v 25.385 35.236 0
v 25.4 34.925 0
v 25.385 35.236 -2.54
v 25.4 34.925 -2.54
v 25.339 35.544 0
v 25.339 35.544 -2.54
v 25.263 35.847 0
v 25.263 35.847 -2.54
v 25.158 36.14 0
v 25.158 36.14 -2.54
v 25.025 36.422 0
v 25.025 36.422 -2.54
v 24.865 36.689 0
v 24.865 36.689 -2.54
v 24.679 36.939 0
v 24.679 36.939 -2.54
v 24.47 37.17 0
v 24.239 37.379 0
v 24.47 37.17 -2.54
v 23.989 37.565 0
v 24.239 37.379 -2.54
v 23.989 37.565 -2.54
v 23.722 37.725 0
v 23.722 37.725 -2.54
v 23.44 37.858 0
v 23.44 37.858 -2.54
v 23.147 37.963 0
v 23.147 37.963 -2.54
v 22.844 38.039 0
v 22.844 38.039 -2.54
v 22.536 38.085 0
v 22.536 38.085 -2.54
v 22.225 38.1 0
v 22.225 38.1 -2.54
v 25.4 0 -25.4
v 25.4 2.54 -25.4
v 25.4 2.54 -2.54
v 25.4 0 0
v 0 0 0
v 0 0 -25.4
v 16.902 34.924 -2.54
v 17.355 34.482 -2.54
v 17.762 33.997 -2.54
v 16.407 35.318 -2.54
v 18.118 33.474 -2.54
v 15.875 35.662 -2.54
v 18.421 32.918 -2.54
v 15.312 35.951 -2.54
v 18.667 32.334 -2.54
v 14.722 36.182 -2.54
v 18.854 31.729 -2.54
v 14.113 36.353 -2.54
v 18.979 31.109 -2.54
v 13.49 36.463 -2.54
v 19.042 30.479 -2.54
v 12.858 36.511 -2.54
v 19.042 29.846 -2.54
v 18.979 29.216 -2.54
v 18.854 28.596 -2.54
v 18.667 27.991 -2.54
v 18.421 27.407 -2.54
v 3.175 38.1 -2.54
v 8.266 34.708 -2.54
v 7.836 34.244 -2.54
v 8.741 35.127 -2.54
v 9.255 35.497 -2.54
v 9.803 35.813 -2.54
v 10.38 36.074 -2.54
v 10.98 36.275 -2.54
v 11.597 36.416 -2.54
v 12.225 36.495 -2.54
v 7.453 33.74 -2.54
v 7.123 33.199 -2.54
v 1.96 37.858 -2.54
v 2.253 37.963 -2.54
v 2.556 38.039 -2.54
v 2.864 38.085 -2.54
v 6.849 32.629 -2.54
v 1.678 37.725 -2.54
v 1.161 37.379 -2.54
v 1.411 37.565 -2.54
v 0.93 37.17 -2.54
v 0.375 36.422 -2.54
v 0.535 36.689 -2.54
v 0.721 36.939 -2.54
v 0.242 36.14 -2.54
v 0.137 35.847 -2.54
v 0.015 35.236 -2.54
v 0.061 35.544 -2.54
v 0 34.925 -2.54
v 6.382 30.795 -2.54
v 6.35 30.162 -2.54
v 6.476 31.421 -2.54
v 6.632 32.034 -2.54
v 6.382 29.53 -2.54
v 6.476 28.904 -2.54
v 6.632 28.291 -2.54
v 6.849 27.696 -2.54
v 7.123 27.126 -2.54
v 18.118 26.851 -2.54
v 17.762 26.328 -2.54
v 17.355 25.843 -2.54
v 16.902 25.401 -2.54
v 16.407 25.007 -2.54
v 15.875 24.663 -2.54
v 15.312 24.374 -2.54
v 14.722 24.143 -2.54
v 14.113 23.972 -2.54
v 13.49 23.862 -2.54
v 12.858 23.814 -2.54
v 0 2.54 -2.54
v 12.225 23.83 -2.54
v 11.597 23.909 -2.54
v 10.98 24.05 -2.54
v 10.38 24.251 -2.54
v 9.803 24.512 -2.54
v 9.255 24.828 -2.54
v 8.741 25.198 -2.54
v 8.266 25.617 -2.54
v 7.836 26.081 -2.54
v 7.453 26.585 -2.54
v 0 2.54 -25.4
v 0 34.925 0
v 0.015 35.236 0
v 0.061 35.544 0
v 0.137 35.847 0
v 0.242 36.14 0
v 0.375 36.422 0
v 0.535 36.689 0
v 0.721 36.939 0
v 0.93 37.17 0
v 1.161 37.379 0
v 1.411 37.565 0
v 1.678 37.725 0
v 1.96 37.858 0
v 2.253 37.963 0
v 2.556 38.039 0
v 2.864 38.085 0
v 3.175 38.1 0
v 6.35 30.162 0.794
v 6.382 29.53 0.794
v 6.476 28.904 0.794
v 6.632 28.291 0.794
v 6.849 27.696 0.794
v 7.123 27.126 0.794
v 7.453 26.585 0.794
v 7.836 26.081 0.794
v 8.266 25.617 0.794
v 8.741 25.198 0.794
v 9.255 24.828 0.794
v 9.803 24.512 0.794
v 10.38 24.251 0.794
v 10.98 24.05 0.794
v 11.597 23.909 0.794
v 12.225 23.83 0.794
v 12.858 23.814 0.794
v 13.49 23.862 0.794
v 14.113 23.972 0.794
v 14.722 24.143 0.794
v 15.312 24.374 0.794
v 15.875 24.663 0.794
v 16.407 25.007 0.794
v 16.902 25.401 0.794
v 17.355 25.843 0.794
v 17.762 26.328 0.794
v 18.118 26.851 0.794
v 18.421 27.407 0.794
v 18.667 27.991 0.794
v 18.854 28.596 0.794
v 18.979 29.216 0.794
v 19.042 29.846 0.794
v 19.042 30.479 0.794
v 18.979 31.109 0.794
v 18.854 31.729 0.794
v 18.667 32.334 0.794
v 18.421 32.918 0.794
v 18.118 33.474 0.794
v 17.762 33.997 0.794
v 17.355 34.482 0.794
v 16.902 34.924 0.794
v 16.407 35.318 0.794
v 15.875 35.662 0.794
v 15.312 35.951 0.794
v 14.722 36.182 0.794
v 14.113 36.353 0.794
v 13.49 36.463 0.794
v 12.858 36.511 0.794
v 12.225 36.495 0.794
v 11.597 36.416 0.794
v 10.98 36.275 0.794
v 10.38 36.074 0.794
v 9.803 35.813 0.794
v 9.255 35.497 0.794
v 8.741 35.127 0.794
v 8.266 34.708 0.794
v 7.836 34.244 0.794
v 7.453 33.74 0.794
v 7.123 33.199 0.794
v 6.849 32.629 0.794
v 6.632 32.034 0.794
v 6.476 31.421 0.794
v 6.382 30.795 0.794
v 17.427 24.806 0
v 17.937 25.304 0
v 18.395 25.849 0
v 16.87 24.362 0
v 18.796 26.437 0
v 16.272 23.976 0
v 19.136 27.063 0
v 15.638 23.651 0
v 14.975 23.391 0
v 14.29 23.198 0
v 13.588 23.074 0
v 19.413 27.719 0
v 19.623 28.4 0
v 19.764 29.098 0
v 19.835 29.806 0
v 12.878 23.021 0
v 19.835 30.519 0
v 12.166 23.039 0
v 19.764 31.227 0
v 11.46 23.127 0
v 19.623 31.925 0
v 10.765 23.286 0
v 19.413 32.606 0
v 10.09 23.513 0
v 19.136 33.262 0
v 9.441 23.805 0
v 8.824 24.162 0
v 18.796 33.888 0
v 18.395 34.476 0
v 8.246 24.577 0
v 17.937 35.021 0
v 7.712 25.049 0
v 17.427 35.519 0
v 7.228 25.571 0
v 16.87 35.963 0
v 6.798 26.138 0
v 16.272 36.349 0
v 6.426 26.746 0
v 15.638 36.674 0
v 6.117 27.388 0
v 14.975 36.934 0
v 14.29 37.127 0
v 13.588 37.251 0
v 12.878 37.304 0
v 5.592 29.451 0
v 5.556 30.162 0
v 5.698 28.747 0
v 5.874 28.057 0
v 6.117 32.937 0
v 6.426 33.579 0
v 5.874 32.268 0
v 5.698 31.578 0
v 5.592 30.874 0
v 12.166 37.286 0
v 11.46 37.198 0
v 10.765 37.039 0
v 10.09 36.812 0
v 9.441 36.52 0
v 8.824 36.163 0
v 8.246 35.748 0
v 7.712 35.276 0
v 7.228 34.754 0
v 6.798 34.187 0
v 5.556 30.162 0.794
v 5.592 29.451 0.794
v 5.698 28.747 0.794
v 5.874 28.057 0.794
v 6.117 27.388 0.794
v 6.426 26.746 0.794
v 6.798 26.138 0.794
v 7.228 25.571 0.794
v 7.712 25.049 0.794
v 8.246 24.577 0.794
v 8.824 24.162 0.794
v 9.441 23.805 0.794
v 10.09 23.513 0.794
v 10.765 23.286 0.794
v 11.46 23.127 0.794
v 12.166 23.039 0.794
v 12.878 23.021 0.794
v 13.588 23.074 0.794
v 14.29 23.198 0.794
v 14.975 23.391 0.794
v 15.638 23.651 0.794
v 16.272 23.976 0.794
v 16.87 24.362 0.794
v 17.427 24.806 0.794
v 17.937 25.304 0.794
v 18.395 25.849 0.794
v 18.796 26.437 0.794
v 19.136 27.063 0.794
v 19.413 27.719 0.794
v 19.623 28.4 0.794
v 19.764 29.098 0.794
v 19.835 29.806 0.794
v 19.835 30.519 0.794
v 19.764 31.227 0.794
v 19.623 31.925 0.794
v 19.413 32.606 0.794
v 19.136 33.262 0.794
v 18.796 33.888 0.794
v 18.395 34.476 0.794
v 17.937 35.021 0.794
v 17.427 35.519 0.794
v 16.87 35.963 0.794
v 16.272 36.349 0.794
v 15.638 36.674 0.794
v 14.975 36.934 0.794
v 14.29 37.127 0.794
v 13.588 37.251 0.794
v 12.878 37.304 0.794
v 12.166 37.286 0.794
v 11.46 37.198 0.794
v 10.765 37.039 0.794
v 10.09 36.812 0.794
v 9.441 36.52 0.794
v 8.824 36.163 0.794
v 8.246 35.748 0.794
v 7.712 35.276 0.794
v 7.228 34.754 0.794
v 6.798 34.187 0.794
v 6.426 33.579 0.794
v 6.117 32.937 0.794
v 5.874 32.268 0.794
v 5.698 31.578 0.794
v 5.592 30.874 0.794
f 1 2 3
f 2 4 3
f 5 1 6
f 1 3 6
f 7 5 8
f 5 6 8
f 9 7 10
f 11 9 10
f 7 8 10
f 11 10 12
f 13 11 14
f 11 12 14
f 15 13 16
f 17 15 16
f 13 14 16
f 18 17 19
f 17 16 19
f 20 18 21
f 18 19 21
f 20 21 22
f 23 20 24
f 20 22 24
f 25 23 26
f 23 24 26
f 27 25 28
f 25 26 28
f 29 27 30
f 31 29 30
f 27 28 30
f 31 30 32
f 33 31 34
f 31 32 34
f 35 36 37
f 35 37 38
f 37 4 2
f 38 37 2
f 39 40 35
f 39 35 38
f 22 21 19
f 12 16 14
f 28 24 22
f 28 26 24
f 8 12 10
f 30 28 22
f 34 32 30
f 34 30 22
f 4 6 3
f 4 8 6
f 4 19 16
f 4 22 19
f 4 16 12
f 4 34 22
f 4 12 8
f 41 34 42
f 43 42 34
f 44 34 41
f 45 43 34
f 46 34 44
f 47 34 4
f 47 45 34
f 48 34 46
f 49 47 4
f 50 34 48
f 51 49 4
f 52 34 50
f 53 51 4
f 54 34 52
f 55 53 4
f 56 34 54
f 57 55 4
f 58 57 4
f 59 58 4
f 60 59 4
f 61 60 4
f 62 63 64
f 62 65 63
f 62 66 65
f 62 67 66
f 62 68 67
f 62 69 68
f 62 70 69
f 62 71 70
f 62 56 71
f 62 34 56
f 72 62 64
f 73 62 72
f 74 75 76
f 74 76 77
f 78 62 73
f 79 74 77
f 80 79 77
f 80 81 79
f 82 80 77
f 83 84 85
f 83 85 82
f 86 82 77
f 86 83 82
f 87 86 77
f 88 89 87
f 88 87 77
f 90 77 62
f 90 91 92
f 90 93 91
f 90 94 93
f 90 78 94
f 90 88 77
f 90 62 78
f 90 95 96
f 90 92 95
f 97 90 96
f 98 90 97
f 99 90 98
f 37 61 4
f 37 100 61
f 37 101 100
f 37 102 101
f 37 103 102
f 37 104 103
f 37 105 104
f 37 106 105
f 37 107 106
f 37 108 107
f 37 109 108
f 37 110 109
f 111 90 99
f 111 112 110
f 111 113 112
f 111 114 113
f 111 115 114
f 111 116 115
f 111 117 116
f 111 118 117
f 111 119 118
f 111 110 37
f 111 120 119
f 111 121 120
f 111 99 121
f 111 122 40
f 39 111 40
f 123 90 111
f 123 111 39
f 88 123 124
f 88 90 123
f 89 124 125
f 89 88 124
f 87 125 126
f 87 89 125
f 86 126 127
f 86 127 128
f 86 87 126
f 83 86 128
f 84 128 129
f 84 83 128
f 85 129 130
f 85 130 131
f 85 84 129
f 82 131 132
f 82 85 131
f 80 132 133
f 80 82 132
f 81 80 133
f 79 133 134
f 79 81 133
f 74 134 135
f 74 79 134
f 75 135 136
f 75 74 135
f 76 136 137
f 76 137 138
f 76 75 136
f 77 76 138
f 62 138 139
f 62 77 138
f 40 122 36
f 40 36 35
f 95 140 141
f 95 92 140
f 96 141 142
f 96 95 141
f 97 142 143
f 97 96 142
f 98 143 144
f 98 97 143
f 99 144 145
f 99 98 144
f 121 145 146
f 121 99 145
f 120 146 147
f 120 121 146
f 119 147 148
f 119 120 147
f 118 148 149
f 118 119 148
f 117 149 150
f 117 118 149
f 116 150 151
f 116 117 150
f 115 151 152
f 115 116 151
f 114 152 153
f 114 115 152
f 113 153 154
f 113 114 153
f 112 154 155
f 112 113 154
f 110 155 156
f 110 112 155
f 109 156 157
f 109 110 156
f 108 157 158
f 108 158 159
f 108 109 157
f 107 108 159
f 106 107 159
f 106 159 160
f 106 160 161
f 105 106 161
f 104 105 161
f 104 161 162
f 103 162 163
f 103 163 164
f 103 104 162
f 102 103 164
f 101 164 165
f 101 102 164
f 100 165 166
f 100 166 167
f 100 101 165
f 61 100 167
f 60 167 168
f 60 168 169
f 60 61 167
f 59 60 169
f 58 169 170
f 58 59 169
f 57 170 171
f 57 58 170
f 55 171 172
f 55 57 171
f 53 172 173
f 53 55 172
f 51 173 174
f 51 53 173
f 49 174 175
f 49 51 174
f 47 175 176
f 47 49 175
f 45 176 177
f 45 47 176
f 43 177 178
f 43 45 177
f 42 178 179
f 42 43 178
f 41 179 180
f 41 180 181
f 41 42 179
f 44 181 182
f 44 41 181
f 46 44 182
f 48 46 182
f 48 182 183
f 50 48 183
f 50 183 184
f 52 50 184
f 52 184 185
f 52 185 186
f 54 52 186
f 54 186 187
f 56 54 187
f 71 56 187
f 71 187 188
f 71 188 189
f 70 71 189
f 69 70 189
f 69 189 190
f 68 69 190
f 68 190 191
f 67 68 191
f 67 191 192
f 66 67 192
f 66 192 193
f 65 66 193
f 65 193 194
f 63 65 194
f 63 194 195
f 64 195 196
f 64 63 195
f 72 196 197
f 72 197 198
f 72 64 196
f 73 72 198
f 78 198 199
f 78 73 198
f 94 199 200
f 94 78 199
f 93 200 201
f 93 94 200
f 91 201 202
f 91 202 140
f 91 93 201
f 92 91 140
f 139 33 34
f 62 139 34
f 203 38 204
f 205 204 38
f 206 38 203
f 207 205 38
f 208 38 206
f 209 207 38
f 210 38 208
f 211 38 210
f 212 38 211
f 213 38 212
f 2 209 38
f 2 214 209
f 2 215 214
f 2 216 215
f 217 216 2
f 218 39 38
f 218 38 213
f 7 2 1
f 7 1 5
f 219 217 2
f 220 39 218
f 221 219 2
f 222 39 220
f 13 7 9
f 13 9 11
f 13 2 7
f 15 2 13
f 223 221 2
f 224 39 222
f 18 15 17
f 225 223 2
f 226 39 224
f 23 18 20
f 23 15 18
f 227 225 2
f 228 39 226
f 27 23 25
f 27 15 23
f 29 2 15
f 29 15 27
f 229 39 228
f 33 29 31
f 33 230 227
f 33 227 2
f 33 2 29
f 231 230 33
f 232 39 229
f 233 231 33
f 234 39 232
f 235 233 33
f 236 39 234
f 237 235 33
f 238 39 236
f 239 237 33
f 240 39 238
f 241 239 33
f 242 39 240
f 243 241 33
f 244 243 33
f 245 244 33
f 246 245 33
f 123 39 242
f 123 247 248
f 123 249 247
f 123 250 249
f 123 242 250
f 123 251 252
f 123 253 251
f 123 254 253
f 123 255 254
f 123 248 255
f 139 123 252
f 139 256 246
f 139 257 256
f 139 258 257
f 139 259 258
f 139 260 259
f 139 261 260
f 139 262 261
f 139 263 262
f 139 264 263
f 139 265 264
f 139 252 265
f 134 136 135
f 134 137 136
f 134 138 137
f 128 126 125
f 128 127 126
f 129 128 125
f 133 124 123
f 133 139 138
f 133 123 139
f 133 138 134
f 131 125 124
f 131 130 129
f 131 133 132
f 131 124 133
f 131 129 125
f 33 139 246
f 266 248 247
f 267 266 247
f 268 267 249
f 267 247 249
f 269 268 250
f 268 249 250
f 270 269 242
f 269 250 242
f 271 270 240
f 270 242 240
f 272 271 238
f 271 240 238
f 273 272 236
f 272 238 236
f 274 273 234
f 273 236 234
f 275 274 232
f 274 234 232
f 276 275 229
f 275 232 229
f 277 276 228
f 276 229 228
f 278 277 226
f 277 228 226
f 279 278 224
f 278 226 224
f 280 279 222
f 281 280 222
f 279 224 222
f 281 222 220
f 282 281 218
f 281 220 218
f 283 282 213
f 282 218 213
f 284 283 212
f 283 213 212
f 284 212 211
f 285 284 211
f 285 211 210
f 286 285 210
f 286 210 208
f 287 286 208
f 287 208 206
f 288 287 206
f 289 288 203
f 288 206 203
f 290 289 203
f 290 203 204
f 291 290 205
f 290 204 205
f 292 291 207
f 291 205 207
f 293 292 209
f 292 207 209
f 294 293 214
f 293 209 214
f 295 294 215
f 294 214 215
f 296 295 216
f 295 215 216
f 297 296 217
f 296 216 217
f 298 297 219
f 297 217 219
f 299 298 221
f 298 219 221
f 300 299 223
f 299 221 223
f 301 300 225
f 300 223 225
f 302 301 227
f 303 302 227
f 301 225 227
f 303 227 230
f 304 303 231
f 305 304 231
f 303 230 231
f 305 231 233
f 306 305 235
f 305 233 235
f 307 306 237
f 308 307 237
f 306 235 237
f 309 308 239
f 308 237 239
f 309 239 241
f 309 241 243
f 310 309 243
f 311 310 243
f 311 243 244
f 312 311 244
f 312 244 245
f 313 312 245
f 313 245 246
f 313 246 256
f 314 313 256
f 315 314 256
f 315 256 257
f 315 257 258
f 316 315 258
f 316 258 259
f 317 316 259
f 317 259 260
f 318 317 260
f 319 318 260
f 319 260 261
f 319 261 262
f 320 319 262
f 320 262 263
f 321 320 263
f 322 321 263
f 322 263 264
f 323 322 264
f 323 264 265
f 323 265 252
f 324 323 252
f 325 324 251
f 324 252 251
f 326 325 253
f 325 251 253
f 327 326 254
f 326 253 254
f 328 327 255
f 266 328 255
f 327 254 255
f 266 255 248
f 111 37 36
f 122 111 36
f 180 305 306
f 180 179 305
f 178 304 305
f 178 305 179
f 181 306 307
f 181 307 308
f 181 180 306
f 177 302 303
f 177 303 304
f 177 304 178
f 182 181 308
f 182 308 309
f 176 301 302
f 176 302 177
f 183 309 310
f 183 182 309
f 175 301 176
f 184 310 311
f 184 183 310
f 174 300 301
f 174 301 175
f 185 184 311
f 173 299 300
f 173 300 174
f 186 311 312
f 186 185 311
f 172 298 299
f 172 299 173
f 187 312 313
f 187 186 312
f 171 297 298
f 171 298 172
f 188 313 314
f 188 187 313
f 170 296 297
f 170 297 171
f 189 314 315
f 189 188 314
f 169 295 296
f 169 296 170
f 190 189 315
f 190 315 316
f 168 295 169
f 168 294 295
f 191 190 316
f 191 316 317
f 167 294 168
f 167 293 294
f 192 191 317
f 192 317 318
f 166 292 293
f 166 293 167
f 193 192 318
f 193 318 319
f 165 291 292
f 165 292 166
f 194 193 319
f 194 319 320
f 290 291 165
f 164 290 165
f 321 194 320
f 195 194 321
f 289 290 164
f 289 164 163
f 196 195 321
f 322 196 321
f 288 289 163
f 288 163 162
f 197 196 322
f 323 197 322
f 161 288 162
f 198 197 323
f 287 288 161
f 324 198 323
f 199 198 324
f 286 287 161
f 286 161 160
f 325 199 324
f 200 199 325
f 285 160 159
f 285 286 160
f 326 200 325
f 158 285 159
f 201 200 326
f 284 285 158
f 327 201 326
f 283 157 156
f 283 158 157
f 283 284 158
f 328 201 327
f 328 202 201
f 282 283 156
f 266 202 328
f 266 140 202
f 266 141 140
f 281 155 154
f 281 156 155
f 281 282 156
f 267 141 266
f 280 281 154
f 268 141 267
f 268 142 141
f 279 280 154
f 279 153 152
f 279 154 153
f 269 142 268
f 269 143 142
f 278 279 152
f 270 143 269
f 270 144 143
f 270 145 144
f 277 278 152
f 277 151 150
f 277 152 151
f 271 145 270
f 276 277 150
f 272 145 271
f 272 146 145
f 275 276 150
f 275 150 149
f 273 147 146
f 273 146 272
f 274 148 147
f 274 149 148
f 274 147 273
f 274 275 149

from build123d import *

# Parameters (mm, degrees)
BOSS_EXTRUDE1_DEPTH = 25.4
CUT_EXTRUDE1_REACH  = 53.18
SKETCH2_R           = 6.35
FILLET1_R           = 3.175
SKETCH3_R           = 7.14375
SKETCH3_R_2         = 6.35
BOSS_EXTRUDE2_DEPTH = 0.79375


with BuildPart() as part:
    # Sketch1 → Boss-Extrude1 (new body)
    with BuildSketch(Plane(origin=(0, 0, 0), x_dir=(0, 0, -1), z_dir=(1, 0, 0))):
        Polygon((2.54, 2.54), (25.4, 2.54), (25.4, 0), (0, 0), (0, 38.1), (2.54, 38.1), align=None)
    extrude(amount=BOSS_EXTRUDE1_DEPTH)

    # Sketch2 → Cut-Extrude1 (cut, up to next)
    with BuildSketch(Plane(origin=(0, 0, -2.54), x_dir=(-1, 0, 0), z_dir=(0, 0, -1)), mode=Mode.PRIVATE) as cut_extrude1_sk1:
        with Locations((-12.7, 30.1625)):
            Circle(SKETCH2_R)
    cut_extrude1_tool1 = extrude(cut_extrude1_sk1.sketch, amount=-CUT_EXTRUDE1_REACH, mode=Mode.PRIVATE) & part.part
    add(cut_extrude1_tool1.solids().sort_by_distance((12.7, 30.1625, -2.54))[0], mode=Mode.SUBTRACT)

    # Fillet1
    fillet1_edges = [part.edges().sort_by_distance(p)[0] for p in [
        (25.4, 38.1, -1.27),
        (0, 38.1, -1.27),
    ]]
    fillet(fillet1_edges, radius=FILLET1_R)

    # Sketch3 → Boss-Extrude2 (add)
    with BuildSketch(Plane.XY):
        with Locations(Location((12.7, 30.1625, 0), (0, 0, 180))):
            Circle(SKETCH3_R)
        with Locations(Location((12.7, 30.1625, 0), (0, 0, 180))):
            Circle(SKETCH3_R_2, mode=Mode.SUBTRACT)
    extrude(amount=BOSS_EXTRUDE2_DEPTH)


solid = part.part
